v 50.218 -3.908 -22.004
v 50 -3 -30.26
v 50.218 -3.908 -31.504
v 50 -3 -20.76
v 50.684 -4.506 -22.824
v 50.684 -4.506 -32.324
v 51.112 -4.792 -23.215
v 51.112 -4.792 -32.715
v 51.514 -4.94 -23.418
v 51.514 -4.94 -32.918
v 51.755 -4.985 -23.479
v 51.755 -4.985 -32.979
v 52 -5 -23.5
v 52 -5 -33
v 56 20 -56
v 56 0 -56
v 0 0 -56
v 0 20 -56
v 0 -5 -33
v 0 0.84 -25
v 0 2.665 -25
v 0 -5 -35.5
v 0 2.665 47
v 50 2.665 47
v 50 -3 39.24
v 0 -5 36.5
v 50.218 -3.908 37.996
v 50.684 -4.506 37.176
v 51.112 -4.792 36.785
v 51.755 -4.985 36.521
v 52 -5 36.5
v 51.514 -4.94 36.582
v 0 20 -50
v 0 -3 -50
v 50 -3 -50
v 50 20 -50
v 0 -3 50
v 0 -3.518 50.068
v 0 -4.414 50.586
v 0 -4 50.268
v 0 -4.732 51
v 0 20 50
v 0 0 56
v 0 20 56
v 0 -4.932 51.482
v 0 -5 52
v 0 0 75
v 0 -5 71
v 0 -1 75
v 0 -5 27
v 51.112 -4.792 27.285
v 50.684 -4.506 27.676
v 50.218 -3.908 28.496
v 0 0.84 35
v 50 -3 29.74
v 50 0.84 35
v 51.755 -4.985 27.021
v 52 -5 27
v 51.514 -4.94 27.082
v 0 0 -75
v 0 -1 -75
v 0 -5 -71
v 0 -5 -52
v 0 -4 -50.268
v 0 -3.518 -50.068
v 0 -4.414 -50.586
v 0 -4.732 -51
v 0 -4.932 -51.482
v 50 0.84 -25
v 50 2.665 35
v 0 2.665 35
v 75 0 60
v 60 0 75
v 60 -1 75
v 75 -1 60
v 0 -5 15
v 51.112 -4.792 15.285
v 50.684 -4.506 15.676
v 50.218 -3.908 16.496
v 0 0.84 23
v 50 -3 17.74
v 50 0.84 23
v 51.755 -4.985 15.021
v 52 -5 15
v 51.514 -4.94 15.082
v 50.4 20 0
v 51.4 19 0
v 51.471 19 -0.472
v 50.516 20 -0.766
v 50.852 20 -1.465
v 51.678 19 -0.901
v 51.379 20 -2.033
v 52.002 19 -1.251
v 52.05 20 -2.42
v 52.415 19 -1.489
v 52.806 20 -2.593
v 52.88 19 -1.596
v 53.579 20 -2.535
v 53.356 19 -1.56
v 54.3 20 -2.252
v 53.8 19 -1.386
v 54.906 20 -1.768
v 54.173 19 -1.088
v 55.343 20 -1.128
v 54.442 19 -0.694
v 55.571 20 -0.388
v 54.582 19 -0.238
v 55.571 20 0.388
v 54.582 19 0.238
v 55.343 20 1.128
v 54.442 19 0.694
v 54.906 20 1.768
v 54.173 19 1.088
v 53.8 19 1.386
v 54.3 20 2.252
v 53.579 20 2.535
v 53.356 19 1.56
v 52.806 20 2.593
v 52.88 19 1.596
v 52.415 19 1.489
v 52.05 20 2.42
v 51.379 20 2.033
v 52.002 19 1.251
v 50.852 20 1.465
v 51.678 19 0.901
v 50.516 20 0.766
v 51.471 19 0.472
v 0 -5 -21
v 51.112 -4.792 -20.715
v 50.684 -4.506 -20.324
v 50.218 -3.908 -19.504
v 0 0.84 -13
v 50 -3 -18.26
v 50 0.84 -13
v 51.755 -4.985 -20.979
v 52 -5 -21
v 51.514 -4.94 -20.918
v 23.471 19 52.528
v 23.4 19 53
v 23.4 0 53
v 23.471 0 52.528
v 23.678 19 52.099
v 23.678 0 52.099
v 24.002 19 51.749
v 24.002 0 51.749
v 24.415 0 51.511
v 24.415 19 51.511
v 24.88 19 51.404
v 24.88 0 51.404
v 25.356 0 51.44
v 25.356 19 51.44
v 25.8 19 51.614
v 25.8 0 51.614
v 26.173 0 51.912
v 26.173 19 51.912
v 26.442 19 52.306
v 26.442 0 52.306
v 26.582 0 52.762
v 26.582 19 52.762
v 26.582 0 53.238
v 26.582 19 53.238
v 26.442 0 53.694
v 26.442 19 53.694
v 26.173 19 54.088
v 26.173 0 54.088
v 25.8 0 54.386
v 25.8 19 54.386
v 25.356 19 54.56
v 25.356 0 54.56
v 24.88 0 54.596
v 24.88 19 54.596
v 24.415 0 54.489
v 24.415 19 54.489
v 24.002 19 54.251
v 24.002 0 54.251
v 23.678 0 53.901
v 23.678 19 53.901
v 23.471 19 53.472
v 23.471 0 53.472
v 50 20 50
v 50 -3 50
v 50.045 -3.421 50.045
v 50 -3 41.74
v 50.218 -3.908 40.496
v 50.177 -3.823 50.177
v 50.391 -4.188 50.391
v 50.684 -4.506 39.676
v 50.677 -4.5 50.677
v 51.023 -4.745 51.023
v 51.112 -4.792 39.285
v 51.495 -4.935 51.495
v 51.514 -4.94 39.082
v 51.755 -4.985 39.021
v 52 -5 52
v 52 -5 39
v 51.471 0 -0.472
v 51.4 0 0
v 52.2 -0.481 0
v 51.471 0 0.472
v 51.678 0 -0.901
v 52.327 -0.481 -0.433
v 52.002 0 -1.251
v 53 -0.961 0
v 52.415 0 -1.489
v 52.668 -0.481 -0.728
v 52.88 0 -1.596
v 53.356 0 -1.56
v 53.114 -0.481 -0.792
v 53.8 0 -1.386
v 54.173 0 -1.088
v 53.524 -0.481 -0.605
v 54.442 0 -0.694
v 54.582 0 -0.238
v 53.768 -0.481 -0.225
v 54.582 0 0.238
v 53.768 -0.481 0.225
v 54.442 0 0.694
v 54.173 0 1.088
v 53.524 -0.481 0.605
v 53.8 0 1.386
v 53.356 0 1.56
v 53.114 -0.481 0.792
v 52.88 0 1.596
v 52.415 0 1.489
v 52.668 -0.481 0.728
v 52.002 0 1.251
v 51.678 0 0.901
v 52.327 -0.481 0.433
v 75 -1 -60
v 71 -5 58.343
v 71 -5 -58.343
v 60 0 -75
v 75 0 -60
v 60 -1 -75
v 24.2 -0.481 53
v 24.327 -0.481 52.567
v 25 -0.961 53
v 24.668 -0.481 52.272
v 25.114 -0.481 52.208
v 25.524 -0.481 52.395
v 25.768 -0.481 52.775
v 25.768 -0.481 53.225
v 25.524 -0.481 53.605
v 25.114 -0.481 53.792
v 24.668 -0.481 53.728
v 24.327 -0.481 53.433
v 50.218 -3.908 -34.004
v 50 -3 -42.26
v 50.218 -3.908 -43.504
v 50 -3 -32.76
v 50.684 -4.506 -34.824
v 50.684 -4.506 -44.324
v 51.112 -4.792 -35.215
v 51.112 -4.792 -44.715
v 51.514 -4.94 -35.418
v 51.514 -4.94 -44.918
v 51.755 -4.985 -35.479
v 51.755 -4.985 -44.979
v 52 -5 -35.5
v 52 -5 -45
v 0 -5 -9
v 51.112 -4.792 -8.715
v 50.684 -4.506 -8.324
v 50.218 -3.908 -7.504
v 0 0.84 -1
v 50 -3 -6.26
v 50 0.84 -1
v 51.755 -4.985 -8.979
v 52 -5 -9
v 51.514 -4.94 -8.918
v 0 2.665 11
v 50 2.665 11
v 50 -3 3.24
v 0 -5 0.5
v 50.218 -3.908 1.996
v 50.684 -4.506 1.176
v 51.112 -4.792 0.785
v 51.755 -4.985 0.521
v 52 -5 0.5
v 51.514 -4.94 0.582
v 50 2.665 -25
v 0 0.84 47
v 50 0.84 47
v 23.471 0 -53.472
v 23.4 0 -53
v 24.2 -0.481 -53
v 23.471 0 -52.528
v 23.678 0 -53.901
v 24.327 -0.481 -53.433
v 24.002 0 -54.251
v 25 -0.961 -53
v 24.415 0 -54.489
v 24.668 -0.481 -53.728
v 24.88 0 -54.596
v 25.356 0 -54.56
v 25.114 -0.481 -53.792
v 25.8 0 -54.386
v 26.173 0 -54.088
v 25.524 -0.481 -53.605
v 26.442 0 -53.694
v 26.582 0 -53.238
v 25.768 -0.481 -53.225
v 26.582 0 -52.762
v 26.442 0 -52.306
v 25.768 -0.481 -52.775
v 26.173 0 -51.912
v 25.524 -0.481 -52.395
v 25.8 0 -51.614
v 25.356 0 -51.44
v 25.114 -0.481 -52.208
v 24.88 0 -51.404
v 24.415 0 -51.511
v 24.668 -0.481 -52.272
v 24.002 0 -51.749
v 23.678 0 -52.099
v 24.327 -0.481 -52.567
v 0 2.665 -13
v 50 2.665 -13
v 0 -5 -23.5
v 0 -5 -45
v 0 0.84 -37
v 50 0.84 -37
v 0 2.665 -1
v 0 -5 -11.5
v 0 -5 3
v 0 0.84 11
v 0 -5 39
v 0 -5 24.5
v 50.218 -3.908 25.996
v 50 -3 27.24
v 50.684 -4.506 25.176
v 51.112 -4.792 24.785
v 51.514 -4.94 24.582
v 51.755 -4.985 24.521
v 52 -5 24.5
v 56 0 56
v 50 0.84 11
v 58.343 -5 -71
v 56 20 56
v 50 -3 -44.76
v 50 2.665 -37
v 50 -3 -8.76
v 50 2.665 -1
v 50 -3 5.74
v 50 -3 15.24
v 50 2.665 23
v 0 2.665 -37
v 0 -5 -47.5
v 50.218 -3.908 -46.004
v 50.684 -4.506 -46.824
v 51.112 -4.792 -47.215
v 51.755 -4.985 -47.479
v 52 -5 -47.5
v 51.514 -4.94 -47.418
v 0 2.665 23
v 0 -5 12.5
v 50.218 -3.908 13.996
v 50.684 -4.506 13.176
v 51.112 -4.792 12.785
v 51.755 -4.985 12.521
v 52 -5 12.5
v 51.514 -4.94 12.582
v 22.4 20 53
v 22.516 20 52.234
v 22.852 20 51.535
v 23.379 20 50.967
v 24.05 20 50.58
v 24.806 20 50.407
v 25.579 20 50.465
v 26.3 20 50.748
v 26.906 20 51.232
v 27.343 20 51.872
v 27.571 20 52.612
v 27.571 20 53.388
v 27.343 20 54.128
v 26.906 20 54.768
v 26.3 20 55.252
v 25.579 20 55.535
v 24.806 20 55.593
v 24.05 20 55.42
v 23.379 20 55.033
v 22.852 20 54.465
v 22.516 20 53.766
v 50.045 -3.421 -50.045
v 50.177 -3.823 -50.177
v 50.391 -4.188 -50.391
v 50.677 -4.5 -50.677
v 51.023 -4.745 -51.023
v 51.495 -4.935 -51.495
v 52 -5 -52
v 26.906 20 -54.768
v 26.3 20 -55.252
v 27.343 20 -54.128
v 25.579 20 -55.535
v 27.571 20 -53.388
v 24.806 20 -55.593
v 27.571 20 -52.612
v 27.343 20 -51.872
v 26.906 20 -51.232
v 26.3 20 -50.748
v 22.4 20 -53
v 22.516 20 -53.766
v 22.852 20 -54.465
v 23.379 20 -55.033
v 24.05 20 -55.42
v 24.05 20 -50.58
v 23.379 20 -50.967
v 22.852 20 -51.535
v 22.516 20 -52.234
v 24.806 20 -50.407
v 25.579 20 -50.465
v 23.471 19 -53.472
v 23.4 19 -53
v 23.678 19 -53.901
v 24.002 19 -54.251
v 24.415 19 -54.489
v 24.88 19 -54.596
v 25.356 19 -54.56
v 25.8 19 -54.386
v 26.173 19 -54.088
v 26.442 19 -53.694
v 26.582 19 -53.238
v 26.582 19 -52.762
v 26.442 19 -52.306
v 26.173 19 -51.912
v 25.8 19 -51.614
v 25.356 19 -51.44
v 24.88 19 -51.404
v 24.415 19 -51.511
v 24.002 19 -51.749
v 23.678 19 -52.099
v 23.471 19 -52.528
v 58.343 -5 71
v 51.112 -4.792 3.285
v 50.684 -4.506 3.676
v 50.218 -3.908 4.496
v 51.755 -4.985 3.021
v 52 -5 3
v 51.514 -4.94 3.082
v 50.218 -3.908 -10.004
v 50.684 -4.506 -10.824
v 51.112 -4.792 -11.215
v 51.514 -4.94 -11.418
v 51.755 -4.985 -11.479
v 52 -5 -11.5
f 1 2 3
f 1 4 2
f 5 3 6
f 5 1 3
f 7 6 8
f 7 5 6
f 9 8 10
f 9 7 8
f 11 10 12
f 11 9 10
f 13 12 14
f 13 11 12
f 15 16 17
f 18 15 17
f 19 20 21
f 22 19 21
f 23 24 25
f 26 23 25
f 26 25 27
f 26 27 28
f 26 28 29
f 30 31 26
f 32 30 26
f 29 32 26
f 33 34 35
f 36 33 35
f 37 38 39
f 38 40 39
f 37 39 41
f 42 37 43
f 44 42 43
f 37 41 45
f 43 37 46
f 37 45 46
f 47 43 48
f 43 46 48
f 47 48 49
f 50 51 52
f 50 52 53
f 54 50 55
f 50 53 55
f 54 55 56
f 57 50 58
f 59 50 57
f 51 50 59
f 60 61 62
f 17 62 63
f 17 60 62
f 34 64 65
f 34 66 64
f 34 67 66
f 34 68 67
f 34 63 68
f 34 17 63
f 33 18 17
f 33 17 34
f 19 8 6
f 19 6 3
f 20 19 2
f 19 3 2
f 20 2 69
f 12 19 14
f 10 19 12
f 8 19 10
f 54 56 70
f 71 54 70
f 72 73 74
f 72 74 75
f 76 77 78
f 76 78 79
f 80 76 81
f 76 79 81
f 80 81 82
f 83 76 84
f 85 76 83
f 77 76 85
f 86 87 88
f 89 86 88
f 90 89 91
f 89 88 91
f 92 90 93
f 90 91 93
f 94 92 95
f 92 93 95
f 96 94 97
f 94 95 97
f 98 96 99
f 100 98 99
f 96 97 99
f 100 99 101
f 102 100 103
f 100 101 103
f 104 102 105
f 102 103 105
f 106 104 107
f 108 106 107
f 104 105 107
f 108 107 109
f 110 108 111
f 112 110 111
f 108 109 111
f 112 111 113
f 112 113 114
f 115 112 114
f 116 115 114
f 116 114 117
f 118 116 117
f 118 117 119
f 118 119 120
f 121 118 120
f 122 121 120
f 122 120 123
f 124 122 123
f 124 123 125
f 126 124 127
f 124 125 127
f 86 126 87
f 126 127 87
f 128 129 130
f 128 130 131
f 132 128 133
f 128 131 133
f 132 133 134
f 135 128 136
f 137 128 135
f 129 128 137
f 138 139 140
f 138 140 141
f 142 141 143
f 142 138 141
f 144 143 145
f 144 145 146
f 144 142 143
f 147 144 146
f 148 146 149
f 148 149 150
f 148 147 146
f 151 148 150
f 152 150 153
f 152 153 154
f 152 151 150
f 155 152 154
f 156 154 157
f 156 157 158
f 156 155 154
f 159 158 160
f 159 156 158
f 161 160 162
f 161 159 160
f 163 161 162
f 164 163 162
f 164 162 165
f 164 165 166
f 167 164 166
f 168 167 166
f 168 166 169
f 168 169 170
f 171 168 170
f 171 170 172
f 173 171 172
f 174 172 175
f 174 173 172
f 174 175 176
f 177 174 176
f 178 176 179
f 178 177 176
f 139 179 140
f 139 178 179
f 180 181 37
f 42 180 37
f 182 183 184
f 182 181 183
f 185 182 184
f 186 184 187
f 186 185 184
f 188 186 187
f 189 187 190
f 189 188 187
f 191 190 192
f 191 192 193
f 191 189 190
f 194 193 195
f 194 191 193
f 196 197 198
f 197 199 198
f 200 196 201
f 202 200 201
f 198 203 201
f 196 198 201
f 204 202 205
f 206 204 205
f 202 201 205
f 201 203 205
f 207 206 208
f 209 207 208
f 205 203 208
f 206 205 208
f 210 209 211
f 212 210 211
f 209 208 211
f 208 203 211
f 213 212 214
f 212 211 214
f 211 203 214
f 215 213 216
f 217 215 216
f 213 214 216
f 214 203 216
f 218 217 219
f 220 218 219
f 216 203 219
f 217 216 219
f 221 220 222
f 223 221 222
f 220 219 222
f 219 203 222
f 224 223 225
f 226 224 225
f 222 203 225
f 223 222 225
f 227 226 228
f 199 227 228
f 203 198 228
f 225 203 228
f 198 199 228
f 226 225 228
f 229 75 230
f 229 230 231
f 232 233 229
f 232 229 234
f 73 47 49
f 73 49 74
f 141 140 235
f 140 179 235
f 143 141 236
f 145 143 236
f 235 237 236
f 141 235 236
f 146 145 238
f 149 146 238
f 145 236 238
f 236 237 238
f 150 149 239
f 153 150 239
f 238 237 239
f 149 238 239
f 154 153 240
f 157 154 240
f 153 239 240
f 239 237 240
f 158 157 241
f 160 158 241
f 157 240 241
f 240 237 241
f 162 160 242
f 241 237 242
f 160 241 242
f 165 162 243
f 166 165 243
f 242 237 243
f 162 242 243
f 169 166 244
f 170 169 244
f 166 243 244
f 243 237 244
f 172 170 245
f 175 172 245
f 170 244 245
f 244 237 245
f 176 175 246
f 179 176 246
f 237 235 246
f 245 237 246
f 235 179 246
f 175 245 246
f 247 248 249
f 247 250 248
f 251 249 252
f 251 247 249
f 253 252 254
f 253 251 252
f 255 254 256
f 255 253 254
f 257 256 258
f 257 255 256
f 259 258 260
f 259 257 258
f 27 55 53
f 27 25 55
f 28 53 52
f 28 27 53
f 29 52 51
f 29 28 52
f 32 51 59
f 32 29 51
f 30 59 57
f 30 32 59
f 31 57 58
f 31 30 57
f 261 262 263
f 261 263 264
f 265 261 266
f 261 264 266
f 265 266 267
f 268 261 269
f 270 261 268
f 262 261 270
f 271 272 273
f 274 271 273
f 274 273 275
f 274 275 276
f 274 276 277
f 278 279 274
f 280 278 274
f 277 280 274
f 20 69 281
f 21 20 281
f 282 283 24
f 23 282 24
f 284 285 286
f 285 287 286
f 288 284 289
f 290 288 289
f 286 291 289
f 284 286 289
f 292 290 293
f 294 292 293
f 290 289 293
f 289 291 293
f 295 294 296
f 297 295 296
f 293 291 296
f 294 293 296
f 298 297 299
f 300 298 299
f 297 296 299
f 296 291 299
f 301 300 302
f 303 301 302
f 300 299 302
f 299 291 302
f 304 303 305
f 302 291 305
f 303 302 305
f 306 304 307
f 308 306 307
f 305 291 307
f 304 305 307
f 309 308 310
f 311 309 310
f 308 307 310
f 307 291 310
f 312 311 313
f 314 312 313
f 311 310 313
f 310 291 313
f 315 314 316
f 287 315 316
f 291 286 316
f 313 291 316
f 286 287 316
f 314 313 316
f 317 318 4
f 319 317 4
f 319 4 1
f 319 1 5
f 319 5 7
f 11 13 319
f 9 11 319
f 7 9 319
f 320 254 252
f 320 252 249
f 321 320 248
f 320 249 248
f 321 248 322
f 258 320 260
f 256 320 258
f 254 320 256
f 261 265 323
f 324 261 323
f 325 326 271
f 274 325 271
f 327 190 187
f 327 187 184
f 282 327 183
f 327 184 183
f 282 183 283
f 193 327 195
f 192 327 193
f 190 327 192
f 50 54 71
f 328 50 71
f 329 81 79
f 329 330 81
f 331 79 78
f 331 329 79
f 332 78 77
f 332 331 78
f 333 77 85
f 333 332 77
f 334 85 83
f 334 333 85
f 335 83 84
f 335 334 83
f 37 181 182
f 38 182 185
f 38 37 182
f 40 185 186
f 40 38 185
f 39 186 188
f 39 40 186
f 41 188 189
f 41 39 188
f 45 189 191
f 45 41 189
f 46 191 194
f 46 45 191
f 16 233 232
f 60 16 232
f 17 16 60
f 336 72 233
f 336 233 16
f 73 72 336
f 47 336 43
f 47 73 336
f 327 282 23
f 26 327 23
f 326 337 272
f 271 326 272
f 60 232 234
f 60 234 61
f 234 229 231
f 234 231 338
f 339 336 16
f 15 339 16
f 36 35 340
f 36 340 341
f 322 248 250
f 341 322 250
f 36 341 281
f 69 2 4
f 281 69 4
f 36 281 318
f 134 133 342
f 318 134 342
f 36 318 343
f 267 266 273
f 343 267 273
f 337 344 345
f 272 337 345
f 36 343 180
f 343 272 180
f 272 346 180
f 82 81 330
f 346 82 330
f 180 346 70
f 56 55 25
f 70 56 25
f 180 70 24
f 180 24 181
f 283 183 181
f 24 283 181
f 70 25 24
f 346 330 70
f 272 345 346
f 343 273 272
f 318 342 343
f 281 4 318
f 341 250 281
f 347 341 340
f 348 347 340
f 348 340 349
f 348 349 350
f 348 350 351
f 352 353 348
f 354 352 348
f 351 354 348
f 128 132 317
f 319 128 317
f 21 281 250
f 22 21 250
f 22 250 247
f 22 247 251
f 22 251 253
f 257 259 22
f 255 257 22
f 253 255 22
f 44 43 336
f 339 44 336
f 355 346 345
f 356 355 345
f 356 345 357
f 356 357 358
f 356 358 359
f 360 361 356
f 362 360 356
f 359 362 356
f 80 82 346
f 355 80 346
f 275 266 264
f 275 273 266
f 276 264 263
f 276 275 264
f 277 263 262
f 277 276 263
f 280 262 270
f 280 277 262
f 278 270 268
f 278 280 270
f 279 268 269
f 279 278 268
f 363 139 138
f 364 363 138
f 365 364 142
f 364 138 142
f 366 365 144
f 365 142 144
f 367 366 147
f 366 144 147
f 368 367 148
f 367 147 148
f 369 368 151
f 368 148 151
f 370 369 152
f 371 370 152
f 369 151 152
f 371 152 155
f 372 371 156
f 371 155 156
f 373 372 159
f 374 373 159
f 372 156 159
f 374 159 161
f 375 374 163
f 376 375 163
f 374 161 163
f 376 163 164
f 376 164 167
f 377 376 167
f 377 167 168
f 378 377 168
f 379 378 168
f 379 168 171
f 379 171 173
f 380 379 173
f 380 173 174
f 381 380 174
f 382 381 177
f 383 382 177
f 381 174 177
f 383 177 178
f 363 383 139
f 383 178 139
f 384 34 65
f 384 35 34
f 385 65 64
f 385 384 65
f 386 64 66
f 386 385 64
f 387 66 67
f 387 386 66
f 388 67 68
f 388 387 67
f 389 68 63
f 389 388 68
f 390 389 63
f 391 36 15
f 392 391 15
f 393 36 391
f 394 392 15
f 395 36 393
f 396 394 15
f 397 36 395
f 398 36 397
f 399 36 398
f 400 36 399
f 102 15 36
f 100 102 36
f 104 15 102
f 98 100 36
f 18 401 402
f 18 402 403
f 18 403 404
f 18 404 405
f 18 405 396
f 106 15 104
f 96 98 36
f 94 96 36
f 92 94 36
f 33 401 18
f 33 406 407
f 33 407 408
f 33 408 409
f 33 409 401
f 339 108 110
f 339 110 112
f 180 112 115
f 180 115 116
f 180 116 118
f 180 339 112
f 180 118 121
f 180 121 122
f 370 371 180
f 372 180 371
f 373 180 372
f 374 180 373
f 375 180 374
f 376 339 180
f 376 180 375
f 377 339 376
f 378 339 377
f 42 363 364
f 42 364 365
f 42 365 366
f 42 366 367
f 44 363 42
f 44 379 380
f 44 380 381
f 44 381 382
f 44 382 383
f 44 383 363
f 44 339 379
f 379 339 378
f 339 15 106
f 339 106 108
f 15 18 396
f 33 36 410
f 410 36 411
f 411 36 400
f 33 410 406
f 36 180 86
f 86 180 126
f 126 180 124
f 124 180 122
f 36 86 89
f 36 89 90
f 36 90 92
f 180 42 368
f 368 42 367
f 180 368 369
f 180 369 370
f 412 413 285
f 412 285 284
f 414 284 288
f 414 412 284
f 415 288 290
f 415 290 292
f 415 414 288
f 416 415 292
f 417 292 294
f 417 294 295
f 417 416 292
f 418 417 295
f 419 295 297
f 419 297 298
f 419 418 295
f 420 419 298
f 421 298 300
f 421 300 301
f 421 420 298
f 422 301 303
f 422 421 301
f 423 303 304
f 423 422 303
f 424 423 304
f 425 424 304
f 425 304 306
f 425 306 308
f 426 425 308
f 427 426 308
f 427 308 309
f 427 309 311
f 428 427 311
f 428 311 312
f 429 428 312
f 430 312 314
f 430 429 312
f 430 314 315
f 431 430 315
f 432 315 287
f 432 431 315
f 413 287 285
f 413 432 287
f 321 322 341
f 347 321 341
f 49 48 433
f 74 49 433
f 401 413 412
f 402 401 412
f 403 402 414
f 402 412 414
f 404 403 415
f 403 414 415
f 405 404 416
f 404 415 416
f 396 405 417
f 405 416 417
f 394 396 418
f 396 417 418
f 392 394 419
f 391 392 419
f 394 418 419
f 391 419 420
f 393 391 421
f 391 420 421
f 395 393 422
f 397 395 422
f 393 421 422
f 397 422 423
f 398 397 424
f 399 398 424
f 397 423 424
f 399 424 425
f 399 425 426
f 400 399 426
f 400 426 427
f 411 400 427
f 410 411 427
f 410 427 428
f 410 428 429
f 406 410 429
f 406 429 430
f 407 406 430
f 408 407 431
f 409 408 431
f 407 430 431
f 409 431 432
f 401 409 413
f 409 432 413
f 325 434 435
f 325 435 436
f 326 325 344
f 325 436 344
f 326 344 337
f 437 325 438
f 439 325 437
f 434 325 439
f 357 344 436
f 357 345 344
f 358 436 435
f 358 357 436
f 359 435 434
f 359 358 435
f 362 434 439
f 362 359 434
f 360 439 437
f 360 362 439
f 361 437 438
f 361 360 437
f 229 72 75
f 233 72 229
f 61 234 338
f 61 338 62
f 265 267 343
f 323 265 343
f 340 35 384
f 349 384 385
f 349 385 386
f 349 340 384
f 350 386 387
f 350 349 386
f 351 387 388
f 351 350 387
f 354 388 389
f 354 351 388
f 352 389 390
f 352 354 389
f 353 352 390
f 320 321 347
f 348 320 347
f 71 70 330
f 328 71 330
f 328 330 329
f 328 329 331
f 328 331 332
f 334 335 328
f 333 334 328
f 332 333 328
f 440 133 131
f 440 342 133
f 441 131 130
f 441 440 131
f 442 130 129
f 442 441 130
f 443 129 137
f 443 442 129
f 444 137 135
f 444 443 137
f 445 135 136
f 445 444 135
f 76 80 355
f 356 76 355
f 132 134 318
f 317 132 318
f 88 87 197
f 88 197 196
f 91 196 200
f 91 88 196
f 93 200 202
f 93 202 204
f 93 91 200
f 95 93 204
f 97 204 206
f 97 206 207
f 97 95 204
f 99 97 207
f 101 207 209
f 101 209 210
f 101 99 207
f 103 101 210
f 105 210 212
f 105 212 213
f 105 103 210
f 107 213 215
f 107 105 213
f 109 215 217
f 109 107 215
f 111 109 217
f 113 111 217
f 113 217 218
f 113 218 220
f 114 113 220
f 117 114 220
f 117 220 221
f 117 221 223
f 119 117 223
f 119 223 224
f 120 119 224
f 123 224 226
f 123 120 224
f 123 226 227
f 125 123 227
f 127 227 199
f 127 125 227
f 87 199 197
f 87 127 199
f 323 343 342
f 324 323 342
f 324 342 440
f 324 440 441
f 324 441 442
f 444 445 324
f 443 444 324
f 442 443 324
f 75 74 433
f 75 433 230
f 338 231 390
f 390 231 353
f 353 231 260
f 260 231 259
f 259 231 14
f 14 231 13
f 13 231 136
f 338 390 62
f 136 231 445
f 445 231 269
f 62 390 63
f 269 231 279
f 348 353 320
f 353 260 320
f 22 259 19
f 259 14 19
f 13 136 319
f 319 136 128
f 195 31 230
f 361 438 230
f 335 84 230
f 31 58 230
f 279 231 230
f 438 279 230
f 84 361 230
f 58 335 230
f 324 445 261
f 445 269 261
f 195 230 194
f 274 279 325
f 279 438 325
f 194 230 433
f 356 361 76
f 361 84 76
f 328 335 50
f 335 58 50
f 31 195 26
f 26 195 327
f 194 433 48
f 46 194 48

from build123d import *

# Parameters (mm, degrees)
PAD_DEPTH           = 5
PAD001_DEPTH        = 20
PAD002_DEPTH        = 50
LINEARPATTERN_COUNT = 8
LINEARPATTERN_PITCH = 12
SKETCH003_R         = 1.6
HOLE_DEPTH          = 20
HOLE_TIPS_R         = 1.6
CHAMFER_SIZE        = 4
CHAMFER001_SIZE     = 1
FILLET_R            = 2


with BuildPart() as k_rper:
    # Sketch → Pad (new body)
    with BuildSketch(Plane.XZ):
        Polygon((-50, -50), (-50, 50), (0, 50), (0, 75), (-60, 75), (-75, 60), (-75, -60), (-60, -75), (0, -75), (0, -50), align=None)
    extrude(amount=PAD_DEPTH)

    # Sketch001 → Pad001 (join)
    with BuildSketch(Plane.XZ):
        Polygon((0, 56), (-56, 56), (-56, 0), (-56, -56), (0, -56), (0, -50), (-50, -50), (-50, 0), (-50, 50), (0, 50), align=None)
    extrude(amount=-PAD001_DEPTH)

    # Sketch002 (on Face5 of Pad001) → Pad002 (join)
    with BuildSketch(Plane(origin=(-50, 0, 0), x_dir=(0, 0, 1), z_dir=(1, 0, 0))):
        Polygon((39, 5), (47, -0.839889), (47, -2.664855), (36.5, 5), align=None)
    pad002 = extrude(amount=PAD002_DEPTH)

    # LinearPattern: Pad002 ×8
    with Locations(*[(0, 0, -i * LINEARPATTERN_PITCH) for i in range(1, LINEARPATTERN_COUNT)]):
        add(pad002)

    # Sketch003 (on Face22 of LinearPattern) → Hole (cut)
    with BuildSketch(Plane(origin=(0, 20, 0), x_dir=(1, 0, 0), z_dir=(0, 1, 0))):
        with Locations((-25, 53)):
            Circle(SKETCH003_R)
        with Locations((-53, 0)):
            Circle(SKETCH003_R)
        with Locations((-25, -53)):
            Circle(SKETCH003_R)
    extrude(amount=-HOLE_DEPTH, mode=Mode.SUBTRACT)

    # Hole tips → Hole tip 1 section 0
    with BuildSketch(Plane(origin=(0, 0, 0), x_dir=(1, 0, 0), z_dir=(0, 1, 0)), mode=Mode.PRIVATE) as hole_tip_1_s0:
        with Locations((-25, 53)):
            Circle(HOLE_TIPS_R)
    loft([hole_tip_1_s0.sketch, Vertex(-25, -0.961377, -53)], mode=Mode.SUBTRACT)

    # Hole tips → Hole tip 2 section 0
    with BuildSketch(Plane(origin=(0, 0, 0), x_dir=(1, 0, 0), z_dir=(0, 1, 0)), mode=Mode.PRIVATE) as hole_tip_2_s0:
        with Locations((-53, 0)):
            Circle(HOLE_TIPS_R)
    loft([hole_tip_2_s0.sketch, Vertex(-53, -0.961377, 0)], mode=Mode.SUBTRACT)

    # Hole tips → Hole tip 3 section 0
    with BuildSketch(Plane(origin=(0, 0, 0), x_dir=(1, 0, 0), z_dir=(0, 1, 0)), mode=Mode.PRIVATE) as hole_tip_3_s0:
        with Locations((-25, -53)):
            Circle(HOLE_TIPS_R)
    loft([hole_tip_3_s0.sketch, Vertex(-25, -0.961377, 53)], mode=Mode.SUBTRACT)

    # Chamfer
    chamfer_edges = [k_rper.edges().sort_by_distance(p)[0] for p in [
        (-30, -5, 75),
        (-67.5, -5, 67.5),
        (-75, -5, 0),
        (-67.5, -5, -67.5),
        (-30, -5, -75),
    ]]
    chamfer(chamfer_edges, length=CHAMFER_SIZE)

    # Chamfer001
    chamfer001_edges = [k_rper.edges().sort_by_distance(p)[0] for p in [
        (-23.4, 20, 53),
        (-51.4, 20, 0),
        (-23.4, 20, -53),
    ]]
    chamfer(chamfer001_edges, length=CHAMFER001_SIZE)

    # Fillet
    fillet_edges = [k_rper.edges().sort_by_distance(p)[0] for p in [
        (-25, -5, 50),
        (-50, -5, 44.5),
        (-50, -5, 31.75),
        (-50, -5, 19.75),
        (-50, -5, 7.75),
        (-50, -5, -4.25),
        (-50, -5, -16.25),
        (-50, -5, -28.25),
        (-50, -5, -40.25),
        (-50, -5, -48.75),
        (-25, -5, -50),
    ]]
    fillet(fillet_edges, radius=FILLET_R)


with BuildPart() as part_mirroring:
    # Part__Mirroring: instance of Körper
    add(k_rper.part.mirror(Plane(origin=(0, 0, 0), x_dir=(0, -1, 0), z_dir=(1, 0, 0))))


solid = part_mirroring.part
